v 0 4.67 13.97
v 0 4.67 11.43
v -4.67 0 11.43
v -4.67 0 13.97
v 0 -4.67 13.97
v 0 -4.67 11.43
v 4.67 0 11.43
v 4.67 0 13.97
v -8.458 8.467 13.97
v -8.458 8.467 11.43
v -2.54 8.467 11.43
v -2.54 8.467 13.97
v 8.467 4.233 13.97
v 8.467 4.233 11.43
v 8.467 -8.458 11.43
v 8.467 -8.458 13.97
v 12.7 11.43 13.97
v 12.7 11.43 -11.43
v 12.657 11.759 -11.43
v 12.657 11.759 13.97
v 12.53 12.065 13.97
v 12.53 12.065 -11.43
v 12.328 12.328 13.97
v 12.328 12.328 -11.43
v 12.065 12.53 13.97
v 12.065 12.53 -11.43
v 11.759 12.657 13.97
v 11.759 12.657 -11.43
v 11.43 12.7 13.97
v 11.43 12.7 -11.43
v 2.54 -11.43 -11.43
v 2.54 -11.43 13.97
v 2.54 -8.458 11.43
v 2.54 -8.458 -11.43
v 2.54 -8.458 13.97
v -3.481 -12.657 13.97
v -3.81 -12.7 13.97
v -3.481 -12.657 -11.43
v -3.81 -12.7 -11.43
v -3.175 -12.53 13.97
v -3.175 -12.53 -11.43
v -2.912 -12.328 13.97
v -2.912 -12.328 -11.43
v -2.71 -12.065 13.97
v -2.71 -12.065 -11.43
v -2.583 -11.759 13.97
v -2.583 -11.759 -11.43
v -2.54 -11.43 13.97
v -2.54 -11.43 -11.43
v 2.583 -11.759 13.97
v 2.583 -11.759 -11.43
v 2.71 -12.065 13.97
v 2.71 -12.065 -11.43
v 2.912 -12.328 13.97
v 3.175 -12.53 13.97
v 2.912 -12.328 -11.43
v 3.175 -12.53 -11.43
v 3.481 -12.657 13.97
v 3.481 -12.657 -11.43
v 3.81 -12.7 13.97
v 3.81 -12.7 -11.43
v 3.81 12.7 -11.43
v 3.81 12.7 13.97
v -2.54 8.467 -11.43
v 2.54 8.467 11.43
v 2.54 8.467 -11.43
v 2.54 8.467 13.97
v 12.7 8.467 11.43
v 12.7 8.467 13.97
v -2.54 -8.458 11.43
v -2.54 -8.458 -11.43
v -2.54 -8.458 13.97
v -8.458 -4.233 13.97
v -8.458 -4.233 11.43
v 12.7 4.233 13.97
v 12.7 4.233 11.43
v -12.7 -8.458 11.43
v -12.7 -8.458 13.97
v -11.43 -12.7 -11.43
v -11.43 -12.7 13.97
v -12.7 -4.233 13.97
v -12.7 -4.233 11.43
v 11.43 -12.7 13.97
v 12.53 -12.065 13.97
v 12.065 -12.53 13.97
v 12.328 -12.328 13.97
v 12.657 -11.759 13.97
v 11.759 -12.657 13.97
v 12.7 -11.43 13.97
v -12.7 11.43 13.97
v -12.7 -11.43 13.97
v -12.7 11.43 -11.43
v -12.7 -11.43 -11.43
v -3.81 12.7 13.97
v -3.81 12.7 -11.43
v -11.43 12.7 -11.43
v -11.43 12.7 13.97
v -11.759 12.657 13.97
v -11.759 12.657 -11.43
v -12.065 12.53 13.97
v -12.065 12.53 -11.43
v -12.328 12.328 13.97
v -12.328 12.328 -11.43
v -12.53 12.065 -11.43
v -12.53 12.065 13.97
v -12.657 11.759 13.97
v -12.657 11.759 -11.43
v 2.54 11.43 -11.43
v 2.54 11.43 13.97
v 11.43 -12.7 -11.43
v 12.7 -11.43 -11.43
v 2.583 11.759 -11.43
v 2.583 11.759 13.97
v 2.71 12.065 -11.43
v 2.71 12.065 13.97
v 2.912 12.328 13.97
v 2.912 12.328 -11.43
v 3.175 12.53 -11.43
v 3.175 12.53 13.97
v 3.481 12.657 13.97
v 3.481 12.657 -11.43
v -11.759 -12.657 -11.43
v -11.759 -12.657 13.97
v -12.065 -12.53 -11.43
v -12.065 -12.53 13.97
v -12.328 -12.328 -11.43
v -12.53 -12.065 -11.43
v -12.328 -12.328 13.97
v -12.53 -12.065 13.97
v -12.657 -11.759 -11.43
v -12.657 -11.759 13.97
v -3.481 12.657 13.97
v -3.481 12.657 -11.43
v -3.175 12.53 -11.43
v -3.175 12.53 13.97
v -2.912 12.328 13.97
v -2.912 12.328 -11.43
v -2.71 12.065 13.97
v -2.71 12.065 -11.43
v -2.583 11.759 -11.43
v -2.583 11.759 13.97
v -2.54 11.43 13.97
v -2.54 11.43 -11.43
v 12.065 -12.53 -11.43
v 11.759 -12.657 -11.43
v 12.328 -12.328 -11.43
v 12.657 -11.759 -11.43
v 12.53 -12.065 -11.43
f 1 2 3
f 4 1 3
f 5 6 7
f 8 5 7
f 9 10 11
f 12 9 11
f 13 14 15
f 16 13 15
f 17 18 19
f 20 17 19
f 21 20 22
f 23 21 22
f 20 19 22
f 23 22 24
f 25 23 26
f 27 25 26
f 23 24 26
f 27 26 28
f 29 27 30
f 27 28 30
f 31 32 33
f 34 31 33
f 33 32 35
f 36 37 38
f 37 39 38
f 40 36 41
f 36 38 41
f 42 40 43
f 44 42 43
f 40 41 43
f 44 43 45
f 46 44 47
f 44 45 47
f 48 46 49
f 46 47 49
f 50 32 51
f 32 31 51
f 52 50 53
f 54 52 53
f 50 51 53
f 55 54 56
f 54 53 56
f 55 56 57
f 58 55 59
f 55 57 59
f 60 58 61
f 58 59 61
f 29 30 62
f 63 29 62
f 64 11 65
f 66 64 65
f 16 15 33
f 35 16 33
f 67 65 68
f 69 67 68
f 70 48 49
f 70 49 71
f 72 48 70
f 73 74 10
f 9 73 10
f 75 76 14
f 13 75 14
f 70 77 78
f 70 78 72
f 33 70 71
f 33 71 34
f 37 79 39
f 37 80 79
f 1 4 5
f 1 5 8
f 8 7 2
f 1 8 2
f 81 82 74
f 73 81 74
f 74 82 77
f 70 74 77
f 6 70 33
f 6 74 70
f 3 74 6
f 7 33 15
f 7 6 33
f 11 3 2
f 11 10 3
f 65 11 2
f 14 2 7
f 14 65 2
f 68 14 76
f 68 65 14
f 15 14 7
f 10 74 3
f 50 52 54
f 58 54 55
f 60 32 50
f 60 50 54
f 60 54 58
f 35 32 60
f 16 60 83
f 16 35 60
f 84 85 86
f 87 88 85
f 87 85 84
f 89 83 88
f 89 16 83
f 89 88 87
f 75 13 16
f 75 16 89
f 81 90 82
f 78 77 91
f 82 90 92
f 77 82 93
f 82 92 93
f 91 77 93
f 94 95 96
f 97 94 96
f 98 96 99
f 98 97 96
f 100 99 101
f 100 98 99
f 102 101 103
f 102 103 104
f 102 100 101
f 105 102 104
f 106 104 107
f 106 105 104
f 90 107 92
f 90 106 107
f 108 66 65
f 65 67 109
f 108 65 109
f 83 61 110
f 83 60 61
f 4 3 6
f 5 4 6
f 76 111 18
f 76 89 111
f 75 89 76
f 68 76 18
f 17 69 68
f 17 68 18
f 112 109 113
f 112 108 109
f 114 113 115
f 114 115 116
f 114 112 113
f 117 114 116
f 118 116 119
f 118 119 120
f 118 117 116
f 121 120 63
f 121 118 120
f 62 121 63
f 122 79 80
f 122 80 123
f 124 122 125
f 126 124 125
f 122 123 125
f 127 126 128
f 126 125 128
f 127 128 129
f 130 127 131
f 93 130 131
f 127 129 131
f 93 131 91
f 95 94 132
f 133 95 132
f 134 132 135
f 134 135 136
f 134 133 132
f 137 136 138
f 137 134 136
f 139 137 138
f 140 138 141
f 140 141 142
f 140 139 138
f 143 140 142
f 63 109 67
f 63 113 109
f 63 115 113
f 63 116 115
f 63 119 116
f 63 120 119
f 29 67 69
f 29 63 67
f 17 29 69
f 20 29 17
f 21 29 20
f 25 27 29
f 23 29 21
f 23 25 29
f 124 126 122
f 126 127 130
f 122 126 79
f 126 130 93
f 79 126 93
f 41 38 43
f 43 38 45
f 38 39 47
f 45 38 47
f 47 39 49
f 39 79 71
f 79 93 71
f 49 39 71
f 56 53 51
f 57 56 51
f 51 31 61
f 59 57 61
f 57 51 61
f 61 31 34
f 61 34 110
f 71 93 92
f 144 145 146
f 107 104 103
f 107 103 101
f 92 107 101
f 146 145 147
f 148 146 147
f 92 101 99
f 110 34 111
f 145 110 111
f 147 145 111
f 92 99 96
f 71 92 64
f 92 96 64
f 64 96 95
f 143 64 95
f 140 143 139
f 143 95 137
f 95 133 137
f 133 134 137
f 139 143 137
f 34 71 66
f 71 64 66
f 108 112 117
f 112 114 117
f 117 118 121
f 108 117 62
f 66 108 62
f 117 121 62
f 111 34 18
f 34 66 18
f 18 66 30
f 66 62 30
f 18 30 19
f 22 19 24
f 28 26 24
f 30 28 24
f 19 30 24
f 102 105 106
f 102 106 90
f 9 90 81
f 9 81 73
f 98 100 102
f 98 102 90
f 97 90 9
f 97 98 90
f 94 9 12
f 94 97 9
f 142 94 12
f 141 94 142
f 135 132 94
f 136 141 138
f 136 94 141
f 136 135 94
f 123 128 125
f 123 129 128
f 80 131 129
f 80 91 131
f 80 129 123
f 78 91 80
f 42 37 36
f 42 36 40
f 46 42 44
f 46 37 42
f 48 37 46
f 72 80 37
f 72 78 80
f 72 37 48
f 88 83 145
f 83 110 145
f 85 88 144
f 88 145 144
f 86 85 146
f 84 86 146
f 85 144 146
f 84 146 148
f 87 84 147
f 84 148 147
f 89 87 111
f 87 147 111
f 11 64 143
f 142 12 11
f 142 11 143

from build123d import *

# Parameters (mm, degrees)
F0_W     = 25.4
F0_H     = 25.4
F1_DEPTH = 11.43
F2_W     = 10.16
F2_H     = 4.2333333333
F2_H_2   = 4.2418
F3_DEPTH = 2.54
F2_W_2   = 5.08
F4_DEPTH = 22.861
F5_R     = 1.27


with BuildPart() as f1:
    # F0 (on Top) → F1 (new body, symmetric)
    with BuildSketch(Plane.XY):
        Rectangle(F0_W, F0_H)
    extrude(amount=F1_DEPTH, both=True)

    # F2 (on face) → F3 (join)
    with BuildSketch(Plane.XY.offset(11.43)):
        Polygon((-2.54, 12.7), (-12.7, 12.7), (-12.7, -4.2333333333), (-8.4582, -4.2333333333), (-8.4582, 8.4666666667), (-2.54, 8.4666666667), align=None)
        with Locations((7.62, 10.5833333333)):
            Rectangle(F2_W, F2_H)
        Polygon((8.4666666667, -8.4582), (2.54, -8.4582), (2.54, -12.7), (12.7, -12.7), (12.7, 4.2333333333), (8.4666666667, 4.2333333333), align=None)
        Polygon((4.669733183, 0), (0, 4.669733183), (-4.669733183, 0), (0, -4.669733183), align=None)
        with Locations((-7.62, -10.5791)):
            Rectangle(F2_W, F2_H_2)
    extrude(amount=F3_DEPTH)

    # F2 (on face) → F4 (cut, through all)
    with BuildSketch(Plane.XY.offset(11.43)):
        with Locations((0, 10.5833333333)):
            Rectangle(F2_W_2, F2_H)
        with Locations((0, -10.5791)):
            Rectangle(F2_W_2, F2_H_2)
    extrude(amount=-F4_DEPTH, mode=Mode.SUBTRACT)

    # F5
    f5_edges = [f1.edges().sort_by_distance(p)[0] for p in [
        (-12.7, 12.7, 1.27),
        (-12.7, -12.7, 1.27),
        (12.7, 12.7, 1.27),
        (12.7, -12.7, 1.27),
        (2.54, -12.7, 1.27),
        (-2.54, -12.7, 1.27),
        (2.54, 12.7, 1.27),
        (-2.54, 12.7, 1.27),
    ]]
    fillet(f5_edges, radius=F5_R)


solid = f1.part
